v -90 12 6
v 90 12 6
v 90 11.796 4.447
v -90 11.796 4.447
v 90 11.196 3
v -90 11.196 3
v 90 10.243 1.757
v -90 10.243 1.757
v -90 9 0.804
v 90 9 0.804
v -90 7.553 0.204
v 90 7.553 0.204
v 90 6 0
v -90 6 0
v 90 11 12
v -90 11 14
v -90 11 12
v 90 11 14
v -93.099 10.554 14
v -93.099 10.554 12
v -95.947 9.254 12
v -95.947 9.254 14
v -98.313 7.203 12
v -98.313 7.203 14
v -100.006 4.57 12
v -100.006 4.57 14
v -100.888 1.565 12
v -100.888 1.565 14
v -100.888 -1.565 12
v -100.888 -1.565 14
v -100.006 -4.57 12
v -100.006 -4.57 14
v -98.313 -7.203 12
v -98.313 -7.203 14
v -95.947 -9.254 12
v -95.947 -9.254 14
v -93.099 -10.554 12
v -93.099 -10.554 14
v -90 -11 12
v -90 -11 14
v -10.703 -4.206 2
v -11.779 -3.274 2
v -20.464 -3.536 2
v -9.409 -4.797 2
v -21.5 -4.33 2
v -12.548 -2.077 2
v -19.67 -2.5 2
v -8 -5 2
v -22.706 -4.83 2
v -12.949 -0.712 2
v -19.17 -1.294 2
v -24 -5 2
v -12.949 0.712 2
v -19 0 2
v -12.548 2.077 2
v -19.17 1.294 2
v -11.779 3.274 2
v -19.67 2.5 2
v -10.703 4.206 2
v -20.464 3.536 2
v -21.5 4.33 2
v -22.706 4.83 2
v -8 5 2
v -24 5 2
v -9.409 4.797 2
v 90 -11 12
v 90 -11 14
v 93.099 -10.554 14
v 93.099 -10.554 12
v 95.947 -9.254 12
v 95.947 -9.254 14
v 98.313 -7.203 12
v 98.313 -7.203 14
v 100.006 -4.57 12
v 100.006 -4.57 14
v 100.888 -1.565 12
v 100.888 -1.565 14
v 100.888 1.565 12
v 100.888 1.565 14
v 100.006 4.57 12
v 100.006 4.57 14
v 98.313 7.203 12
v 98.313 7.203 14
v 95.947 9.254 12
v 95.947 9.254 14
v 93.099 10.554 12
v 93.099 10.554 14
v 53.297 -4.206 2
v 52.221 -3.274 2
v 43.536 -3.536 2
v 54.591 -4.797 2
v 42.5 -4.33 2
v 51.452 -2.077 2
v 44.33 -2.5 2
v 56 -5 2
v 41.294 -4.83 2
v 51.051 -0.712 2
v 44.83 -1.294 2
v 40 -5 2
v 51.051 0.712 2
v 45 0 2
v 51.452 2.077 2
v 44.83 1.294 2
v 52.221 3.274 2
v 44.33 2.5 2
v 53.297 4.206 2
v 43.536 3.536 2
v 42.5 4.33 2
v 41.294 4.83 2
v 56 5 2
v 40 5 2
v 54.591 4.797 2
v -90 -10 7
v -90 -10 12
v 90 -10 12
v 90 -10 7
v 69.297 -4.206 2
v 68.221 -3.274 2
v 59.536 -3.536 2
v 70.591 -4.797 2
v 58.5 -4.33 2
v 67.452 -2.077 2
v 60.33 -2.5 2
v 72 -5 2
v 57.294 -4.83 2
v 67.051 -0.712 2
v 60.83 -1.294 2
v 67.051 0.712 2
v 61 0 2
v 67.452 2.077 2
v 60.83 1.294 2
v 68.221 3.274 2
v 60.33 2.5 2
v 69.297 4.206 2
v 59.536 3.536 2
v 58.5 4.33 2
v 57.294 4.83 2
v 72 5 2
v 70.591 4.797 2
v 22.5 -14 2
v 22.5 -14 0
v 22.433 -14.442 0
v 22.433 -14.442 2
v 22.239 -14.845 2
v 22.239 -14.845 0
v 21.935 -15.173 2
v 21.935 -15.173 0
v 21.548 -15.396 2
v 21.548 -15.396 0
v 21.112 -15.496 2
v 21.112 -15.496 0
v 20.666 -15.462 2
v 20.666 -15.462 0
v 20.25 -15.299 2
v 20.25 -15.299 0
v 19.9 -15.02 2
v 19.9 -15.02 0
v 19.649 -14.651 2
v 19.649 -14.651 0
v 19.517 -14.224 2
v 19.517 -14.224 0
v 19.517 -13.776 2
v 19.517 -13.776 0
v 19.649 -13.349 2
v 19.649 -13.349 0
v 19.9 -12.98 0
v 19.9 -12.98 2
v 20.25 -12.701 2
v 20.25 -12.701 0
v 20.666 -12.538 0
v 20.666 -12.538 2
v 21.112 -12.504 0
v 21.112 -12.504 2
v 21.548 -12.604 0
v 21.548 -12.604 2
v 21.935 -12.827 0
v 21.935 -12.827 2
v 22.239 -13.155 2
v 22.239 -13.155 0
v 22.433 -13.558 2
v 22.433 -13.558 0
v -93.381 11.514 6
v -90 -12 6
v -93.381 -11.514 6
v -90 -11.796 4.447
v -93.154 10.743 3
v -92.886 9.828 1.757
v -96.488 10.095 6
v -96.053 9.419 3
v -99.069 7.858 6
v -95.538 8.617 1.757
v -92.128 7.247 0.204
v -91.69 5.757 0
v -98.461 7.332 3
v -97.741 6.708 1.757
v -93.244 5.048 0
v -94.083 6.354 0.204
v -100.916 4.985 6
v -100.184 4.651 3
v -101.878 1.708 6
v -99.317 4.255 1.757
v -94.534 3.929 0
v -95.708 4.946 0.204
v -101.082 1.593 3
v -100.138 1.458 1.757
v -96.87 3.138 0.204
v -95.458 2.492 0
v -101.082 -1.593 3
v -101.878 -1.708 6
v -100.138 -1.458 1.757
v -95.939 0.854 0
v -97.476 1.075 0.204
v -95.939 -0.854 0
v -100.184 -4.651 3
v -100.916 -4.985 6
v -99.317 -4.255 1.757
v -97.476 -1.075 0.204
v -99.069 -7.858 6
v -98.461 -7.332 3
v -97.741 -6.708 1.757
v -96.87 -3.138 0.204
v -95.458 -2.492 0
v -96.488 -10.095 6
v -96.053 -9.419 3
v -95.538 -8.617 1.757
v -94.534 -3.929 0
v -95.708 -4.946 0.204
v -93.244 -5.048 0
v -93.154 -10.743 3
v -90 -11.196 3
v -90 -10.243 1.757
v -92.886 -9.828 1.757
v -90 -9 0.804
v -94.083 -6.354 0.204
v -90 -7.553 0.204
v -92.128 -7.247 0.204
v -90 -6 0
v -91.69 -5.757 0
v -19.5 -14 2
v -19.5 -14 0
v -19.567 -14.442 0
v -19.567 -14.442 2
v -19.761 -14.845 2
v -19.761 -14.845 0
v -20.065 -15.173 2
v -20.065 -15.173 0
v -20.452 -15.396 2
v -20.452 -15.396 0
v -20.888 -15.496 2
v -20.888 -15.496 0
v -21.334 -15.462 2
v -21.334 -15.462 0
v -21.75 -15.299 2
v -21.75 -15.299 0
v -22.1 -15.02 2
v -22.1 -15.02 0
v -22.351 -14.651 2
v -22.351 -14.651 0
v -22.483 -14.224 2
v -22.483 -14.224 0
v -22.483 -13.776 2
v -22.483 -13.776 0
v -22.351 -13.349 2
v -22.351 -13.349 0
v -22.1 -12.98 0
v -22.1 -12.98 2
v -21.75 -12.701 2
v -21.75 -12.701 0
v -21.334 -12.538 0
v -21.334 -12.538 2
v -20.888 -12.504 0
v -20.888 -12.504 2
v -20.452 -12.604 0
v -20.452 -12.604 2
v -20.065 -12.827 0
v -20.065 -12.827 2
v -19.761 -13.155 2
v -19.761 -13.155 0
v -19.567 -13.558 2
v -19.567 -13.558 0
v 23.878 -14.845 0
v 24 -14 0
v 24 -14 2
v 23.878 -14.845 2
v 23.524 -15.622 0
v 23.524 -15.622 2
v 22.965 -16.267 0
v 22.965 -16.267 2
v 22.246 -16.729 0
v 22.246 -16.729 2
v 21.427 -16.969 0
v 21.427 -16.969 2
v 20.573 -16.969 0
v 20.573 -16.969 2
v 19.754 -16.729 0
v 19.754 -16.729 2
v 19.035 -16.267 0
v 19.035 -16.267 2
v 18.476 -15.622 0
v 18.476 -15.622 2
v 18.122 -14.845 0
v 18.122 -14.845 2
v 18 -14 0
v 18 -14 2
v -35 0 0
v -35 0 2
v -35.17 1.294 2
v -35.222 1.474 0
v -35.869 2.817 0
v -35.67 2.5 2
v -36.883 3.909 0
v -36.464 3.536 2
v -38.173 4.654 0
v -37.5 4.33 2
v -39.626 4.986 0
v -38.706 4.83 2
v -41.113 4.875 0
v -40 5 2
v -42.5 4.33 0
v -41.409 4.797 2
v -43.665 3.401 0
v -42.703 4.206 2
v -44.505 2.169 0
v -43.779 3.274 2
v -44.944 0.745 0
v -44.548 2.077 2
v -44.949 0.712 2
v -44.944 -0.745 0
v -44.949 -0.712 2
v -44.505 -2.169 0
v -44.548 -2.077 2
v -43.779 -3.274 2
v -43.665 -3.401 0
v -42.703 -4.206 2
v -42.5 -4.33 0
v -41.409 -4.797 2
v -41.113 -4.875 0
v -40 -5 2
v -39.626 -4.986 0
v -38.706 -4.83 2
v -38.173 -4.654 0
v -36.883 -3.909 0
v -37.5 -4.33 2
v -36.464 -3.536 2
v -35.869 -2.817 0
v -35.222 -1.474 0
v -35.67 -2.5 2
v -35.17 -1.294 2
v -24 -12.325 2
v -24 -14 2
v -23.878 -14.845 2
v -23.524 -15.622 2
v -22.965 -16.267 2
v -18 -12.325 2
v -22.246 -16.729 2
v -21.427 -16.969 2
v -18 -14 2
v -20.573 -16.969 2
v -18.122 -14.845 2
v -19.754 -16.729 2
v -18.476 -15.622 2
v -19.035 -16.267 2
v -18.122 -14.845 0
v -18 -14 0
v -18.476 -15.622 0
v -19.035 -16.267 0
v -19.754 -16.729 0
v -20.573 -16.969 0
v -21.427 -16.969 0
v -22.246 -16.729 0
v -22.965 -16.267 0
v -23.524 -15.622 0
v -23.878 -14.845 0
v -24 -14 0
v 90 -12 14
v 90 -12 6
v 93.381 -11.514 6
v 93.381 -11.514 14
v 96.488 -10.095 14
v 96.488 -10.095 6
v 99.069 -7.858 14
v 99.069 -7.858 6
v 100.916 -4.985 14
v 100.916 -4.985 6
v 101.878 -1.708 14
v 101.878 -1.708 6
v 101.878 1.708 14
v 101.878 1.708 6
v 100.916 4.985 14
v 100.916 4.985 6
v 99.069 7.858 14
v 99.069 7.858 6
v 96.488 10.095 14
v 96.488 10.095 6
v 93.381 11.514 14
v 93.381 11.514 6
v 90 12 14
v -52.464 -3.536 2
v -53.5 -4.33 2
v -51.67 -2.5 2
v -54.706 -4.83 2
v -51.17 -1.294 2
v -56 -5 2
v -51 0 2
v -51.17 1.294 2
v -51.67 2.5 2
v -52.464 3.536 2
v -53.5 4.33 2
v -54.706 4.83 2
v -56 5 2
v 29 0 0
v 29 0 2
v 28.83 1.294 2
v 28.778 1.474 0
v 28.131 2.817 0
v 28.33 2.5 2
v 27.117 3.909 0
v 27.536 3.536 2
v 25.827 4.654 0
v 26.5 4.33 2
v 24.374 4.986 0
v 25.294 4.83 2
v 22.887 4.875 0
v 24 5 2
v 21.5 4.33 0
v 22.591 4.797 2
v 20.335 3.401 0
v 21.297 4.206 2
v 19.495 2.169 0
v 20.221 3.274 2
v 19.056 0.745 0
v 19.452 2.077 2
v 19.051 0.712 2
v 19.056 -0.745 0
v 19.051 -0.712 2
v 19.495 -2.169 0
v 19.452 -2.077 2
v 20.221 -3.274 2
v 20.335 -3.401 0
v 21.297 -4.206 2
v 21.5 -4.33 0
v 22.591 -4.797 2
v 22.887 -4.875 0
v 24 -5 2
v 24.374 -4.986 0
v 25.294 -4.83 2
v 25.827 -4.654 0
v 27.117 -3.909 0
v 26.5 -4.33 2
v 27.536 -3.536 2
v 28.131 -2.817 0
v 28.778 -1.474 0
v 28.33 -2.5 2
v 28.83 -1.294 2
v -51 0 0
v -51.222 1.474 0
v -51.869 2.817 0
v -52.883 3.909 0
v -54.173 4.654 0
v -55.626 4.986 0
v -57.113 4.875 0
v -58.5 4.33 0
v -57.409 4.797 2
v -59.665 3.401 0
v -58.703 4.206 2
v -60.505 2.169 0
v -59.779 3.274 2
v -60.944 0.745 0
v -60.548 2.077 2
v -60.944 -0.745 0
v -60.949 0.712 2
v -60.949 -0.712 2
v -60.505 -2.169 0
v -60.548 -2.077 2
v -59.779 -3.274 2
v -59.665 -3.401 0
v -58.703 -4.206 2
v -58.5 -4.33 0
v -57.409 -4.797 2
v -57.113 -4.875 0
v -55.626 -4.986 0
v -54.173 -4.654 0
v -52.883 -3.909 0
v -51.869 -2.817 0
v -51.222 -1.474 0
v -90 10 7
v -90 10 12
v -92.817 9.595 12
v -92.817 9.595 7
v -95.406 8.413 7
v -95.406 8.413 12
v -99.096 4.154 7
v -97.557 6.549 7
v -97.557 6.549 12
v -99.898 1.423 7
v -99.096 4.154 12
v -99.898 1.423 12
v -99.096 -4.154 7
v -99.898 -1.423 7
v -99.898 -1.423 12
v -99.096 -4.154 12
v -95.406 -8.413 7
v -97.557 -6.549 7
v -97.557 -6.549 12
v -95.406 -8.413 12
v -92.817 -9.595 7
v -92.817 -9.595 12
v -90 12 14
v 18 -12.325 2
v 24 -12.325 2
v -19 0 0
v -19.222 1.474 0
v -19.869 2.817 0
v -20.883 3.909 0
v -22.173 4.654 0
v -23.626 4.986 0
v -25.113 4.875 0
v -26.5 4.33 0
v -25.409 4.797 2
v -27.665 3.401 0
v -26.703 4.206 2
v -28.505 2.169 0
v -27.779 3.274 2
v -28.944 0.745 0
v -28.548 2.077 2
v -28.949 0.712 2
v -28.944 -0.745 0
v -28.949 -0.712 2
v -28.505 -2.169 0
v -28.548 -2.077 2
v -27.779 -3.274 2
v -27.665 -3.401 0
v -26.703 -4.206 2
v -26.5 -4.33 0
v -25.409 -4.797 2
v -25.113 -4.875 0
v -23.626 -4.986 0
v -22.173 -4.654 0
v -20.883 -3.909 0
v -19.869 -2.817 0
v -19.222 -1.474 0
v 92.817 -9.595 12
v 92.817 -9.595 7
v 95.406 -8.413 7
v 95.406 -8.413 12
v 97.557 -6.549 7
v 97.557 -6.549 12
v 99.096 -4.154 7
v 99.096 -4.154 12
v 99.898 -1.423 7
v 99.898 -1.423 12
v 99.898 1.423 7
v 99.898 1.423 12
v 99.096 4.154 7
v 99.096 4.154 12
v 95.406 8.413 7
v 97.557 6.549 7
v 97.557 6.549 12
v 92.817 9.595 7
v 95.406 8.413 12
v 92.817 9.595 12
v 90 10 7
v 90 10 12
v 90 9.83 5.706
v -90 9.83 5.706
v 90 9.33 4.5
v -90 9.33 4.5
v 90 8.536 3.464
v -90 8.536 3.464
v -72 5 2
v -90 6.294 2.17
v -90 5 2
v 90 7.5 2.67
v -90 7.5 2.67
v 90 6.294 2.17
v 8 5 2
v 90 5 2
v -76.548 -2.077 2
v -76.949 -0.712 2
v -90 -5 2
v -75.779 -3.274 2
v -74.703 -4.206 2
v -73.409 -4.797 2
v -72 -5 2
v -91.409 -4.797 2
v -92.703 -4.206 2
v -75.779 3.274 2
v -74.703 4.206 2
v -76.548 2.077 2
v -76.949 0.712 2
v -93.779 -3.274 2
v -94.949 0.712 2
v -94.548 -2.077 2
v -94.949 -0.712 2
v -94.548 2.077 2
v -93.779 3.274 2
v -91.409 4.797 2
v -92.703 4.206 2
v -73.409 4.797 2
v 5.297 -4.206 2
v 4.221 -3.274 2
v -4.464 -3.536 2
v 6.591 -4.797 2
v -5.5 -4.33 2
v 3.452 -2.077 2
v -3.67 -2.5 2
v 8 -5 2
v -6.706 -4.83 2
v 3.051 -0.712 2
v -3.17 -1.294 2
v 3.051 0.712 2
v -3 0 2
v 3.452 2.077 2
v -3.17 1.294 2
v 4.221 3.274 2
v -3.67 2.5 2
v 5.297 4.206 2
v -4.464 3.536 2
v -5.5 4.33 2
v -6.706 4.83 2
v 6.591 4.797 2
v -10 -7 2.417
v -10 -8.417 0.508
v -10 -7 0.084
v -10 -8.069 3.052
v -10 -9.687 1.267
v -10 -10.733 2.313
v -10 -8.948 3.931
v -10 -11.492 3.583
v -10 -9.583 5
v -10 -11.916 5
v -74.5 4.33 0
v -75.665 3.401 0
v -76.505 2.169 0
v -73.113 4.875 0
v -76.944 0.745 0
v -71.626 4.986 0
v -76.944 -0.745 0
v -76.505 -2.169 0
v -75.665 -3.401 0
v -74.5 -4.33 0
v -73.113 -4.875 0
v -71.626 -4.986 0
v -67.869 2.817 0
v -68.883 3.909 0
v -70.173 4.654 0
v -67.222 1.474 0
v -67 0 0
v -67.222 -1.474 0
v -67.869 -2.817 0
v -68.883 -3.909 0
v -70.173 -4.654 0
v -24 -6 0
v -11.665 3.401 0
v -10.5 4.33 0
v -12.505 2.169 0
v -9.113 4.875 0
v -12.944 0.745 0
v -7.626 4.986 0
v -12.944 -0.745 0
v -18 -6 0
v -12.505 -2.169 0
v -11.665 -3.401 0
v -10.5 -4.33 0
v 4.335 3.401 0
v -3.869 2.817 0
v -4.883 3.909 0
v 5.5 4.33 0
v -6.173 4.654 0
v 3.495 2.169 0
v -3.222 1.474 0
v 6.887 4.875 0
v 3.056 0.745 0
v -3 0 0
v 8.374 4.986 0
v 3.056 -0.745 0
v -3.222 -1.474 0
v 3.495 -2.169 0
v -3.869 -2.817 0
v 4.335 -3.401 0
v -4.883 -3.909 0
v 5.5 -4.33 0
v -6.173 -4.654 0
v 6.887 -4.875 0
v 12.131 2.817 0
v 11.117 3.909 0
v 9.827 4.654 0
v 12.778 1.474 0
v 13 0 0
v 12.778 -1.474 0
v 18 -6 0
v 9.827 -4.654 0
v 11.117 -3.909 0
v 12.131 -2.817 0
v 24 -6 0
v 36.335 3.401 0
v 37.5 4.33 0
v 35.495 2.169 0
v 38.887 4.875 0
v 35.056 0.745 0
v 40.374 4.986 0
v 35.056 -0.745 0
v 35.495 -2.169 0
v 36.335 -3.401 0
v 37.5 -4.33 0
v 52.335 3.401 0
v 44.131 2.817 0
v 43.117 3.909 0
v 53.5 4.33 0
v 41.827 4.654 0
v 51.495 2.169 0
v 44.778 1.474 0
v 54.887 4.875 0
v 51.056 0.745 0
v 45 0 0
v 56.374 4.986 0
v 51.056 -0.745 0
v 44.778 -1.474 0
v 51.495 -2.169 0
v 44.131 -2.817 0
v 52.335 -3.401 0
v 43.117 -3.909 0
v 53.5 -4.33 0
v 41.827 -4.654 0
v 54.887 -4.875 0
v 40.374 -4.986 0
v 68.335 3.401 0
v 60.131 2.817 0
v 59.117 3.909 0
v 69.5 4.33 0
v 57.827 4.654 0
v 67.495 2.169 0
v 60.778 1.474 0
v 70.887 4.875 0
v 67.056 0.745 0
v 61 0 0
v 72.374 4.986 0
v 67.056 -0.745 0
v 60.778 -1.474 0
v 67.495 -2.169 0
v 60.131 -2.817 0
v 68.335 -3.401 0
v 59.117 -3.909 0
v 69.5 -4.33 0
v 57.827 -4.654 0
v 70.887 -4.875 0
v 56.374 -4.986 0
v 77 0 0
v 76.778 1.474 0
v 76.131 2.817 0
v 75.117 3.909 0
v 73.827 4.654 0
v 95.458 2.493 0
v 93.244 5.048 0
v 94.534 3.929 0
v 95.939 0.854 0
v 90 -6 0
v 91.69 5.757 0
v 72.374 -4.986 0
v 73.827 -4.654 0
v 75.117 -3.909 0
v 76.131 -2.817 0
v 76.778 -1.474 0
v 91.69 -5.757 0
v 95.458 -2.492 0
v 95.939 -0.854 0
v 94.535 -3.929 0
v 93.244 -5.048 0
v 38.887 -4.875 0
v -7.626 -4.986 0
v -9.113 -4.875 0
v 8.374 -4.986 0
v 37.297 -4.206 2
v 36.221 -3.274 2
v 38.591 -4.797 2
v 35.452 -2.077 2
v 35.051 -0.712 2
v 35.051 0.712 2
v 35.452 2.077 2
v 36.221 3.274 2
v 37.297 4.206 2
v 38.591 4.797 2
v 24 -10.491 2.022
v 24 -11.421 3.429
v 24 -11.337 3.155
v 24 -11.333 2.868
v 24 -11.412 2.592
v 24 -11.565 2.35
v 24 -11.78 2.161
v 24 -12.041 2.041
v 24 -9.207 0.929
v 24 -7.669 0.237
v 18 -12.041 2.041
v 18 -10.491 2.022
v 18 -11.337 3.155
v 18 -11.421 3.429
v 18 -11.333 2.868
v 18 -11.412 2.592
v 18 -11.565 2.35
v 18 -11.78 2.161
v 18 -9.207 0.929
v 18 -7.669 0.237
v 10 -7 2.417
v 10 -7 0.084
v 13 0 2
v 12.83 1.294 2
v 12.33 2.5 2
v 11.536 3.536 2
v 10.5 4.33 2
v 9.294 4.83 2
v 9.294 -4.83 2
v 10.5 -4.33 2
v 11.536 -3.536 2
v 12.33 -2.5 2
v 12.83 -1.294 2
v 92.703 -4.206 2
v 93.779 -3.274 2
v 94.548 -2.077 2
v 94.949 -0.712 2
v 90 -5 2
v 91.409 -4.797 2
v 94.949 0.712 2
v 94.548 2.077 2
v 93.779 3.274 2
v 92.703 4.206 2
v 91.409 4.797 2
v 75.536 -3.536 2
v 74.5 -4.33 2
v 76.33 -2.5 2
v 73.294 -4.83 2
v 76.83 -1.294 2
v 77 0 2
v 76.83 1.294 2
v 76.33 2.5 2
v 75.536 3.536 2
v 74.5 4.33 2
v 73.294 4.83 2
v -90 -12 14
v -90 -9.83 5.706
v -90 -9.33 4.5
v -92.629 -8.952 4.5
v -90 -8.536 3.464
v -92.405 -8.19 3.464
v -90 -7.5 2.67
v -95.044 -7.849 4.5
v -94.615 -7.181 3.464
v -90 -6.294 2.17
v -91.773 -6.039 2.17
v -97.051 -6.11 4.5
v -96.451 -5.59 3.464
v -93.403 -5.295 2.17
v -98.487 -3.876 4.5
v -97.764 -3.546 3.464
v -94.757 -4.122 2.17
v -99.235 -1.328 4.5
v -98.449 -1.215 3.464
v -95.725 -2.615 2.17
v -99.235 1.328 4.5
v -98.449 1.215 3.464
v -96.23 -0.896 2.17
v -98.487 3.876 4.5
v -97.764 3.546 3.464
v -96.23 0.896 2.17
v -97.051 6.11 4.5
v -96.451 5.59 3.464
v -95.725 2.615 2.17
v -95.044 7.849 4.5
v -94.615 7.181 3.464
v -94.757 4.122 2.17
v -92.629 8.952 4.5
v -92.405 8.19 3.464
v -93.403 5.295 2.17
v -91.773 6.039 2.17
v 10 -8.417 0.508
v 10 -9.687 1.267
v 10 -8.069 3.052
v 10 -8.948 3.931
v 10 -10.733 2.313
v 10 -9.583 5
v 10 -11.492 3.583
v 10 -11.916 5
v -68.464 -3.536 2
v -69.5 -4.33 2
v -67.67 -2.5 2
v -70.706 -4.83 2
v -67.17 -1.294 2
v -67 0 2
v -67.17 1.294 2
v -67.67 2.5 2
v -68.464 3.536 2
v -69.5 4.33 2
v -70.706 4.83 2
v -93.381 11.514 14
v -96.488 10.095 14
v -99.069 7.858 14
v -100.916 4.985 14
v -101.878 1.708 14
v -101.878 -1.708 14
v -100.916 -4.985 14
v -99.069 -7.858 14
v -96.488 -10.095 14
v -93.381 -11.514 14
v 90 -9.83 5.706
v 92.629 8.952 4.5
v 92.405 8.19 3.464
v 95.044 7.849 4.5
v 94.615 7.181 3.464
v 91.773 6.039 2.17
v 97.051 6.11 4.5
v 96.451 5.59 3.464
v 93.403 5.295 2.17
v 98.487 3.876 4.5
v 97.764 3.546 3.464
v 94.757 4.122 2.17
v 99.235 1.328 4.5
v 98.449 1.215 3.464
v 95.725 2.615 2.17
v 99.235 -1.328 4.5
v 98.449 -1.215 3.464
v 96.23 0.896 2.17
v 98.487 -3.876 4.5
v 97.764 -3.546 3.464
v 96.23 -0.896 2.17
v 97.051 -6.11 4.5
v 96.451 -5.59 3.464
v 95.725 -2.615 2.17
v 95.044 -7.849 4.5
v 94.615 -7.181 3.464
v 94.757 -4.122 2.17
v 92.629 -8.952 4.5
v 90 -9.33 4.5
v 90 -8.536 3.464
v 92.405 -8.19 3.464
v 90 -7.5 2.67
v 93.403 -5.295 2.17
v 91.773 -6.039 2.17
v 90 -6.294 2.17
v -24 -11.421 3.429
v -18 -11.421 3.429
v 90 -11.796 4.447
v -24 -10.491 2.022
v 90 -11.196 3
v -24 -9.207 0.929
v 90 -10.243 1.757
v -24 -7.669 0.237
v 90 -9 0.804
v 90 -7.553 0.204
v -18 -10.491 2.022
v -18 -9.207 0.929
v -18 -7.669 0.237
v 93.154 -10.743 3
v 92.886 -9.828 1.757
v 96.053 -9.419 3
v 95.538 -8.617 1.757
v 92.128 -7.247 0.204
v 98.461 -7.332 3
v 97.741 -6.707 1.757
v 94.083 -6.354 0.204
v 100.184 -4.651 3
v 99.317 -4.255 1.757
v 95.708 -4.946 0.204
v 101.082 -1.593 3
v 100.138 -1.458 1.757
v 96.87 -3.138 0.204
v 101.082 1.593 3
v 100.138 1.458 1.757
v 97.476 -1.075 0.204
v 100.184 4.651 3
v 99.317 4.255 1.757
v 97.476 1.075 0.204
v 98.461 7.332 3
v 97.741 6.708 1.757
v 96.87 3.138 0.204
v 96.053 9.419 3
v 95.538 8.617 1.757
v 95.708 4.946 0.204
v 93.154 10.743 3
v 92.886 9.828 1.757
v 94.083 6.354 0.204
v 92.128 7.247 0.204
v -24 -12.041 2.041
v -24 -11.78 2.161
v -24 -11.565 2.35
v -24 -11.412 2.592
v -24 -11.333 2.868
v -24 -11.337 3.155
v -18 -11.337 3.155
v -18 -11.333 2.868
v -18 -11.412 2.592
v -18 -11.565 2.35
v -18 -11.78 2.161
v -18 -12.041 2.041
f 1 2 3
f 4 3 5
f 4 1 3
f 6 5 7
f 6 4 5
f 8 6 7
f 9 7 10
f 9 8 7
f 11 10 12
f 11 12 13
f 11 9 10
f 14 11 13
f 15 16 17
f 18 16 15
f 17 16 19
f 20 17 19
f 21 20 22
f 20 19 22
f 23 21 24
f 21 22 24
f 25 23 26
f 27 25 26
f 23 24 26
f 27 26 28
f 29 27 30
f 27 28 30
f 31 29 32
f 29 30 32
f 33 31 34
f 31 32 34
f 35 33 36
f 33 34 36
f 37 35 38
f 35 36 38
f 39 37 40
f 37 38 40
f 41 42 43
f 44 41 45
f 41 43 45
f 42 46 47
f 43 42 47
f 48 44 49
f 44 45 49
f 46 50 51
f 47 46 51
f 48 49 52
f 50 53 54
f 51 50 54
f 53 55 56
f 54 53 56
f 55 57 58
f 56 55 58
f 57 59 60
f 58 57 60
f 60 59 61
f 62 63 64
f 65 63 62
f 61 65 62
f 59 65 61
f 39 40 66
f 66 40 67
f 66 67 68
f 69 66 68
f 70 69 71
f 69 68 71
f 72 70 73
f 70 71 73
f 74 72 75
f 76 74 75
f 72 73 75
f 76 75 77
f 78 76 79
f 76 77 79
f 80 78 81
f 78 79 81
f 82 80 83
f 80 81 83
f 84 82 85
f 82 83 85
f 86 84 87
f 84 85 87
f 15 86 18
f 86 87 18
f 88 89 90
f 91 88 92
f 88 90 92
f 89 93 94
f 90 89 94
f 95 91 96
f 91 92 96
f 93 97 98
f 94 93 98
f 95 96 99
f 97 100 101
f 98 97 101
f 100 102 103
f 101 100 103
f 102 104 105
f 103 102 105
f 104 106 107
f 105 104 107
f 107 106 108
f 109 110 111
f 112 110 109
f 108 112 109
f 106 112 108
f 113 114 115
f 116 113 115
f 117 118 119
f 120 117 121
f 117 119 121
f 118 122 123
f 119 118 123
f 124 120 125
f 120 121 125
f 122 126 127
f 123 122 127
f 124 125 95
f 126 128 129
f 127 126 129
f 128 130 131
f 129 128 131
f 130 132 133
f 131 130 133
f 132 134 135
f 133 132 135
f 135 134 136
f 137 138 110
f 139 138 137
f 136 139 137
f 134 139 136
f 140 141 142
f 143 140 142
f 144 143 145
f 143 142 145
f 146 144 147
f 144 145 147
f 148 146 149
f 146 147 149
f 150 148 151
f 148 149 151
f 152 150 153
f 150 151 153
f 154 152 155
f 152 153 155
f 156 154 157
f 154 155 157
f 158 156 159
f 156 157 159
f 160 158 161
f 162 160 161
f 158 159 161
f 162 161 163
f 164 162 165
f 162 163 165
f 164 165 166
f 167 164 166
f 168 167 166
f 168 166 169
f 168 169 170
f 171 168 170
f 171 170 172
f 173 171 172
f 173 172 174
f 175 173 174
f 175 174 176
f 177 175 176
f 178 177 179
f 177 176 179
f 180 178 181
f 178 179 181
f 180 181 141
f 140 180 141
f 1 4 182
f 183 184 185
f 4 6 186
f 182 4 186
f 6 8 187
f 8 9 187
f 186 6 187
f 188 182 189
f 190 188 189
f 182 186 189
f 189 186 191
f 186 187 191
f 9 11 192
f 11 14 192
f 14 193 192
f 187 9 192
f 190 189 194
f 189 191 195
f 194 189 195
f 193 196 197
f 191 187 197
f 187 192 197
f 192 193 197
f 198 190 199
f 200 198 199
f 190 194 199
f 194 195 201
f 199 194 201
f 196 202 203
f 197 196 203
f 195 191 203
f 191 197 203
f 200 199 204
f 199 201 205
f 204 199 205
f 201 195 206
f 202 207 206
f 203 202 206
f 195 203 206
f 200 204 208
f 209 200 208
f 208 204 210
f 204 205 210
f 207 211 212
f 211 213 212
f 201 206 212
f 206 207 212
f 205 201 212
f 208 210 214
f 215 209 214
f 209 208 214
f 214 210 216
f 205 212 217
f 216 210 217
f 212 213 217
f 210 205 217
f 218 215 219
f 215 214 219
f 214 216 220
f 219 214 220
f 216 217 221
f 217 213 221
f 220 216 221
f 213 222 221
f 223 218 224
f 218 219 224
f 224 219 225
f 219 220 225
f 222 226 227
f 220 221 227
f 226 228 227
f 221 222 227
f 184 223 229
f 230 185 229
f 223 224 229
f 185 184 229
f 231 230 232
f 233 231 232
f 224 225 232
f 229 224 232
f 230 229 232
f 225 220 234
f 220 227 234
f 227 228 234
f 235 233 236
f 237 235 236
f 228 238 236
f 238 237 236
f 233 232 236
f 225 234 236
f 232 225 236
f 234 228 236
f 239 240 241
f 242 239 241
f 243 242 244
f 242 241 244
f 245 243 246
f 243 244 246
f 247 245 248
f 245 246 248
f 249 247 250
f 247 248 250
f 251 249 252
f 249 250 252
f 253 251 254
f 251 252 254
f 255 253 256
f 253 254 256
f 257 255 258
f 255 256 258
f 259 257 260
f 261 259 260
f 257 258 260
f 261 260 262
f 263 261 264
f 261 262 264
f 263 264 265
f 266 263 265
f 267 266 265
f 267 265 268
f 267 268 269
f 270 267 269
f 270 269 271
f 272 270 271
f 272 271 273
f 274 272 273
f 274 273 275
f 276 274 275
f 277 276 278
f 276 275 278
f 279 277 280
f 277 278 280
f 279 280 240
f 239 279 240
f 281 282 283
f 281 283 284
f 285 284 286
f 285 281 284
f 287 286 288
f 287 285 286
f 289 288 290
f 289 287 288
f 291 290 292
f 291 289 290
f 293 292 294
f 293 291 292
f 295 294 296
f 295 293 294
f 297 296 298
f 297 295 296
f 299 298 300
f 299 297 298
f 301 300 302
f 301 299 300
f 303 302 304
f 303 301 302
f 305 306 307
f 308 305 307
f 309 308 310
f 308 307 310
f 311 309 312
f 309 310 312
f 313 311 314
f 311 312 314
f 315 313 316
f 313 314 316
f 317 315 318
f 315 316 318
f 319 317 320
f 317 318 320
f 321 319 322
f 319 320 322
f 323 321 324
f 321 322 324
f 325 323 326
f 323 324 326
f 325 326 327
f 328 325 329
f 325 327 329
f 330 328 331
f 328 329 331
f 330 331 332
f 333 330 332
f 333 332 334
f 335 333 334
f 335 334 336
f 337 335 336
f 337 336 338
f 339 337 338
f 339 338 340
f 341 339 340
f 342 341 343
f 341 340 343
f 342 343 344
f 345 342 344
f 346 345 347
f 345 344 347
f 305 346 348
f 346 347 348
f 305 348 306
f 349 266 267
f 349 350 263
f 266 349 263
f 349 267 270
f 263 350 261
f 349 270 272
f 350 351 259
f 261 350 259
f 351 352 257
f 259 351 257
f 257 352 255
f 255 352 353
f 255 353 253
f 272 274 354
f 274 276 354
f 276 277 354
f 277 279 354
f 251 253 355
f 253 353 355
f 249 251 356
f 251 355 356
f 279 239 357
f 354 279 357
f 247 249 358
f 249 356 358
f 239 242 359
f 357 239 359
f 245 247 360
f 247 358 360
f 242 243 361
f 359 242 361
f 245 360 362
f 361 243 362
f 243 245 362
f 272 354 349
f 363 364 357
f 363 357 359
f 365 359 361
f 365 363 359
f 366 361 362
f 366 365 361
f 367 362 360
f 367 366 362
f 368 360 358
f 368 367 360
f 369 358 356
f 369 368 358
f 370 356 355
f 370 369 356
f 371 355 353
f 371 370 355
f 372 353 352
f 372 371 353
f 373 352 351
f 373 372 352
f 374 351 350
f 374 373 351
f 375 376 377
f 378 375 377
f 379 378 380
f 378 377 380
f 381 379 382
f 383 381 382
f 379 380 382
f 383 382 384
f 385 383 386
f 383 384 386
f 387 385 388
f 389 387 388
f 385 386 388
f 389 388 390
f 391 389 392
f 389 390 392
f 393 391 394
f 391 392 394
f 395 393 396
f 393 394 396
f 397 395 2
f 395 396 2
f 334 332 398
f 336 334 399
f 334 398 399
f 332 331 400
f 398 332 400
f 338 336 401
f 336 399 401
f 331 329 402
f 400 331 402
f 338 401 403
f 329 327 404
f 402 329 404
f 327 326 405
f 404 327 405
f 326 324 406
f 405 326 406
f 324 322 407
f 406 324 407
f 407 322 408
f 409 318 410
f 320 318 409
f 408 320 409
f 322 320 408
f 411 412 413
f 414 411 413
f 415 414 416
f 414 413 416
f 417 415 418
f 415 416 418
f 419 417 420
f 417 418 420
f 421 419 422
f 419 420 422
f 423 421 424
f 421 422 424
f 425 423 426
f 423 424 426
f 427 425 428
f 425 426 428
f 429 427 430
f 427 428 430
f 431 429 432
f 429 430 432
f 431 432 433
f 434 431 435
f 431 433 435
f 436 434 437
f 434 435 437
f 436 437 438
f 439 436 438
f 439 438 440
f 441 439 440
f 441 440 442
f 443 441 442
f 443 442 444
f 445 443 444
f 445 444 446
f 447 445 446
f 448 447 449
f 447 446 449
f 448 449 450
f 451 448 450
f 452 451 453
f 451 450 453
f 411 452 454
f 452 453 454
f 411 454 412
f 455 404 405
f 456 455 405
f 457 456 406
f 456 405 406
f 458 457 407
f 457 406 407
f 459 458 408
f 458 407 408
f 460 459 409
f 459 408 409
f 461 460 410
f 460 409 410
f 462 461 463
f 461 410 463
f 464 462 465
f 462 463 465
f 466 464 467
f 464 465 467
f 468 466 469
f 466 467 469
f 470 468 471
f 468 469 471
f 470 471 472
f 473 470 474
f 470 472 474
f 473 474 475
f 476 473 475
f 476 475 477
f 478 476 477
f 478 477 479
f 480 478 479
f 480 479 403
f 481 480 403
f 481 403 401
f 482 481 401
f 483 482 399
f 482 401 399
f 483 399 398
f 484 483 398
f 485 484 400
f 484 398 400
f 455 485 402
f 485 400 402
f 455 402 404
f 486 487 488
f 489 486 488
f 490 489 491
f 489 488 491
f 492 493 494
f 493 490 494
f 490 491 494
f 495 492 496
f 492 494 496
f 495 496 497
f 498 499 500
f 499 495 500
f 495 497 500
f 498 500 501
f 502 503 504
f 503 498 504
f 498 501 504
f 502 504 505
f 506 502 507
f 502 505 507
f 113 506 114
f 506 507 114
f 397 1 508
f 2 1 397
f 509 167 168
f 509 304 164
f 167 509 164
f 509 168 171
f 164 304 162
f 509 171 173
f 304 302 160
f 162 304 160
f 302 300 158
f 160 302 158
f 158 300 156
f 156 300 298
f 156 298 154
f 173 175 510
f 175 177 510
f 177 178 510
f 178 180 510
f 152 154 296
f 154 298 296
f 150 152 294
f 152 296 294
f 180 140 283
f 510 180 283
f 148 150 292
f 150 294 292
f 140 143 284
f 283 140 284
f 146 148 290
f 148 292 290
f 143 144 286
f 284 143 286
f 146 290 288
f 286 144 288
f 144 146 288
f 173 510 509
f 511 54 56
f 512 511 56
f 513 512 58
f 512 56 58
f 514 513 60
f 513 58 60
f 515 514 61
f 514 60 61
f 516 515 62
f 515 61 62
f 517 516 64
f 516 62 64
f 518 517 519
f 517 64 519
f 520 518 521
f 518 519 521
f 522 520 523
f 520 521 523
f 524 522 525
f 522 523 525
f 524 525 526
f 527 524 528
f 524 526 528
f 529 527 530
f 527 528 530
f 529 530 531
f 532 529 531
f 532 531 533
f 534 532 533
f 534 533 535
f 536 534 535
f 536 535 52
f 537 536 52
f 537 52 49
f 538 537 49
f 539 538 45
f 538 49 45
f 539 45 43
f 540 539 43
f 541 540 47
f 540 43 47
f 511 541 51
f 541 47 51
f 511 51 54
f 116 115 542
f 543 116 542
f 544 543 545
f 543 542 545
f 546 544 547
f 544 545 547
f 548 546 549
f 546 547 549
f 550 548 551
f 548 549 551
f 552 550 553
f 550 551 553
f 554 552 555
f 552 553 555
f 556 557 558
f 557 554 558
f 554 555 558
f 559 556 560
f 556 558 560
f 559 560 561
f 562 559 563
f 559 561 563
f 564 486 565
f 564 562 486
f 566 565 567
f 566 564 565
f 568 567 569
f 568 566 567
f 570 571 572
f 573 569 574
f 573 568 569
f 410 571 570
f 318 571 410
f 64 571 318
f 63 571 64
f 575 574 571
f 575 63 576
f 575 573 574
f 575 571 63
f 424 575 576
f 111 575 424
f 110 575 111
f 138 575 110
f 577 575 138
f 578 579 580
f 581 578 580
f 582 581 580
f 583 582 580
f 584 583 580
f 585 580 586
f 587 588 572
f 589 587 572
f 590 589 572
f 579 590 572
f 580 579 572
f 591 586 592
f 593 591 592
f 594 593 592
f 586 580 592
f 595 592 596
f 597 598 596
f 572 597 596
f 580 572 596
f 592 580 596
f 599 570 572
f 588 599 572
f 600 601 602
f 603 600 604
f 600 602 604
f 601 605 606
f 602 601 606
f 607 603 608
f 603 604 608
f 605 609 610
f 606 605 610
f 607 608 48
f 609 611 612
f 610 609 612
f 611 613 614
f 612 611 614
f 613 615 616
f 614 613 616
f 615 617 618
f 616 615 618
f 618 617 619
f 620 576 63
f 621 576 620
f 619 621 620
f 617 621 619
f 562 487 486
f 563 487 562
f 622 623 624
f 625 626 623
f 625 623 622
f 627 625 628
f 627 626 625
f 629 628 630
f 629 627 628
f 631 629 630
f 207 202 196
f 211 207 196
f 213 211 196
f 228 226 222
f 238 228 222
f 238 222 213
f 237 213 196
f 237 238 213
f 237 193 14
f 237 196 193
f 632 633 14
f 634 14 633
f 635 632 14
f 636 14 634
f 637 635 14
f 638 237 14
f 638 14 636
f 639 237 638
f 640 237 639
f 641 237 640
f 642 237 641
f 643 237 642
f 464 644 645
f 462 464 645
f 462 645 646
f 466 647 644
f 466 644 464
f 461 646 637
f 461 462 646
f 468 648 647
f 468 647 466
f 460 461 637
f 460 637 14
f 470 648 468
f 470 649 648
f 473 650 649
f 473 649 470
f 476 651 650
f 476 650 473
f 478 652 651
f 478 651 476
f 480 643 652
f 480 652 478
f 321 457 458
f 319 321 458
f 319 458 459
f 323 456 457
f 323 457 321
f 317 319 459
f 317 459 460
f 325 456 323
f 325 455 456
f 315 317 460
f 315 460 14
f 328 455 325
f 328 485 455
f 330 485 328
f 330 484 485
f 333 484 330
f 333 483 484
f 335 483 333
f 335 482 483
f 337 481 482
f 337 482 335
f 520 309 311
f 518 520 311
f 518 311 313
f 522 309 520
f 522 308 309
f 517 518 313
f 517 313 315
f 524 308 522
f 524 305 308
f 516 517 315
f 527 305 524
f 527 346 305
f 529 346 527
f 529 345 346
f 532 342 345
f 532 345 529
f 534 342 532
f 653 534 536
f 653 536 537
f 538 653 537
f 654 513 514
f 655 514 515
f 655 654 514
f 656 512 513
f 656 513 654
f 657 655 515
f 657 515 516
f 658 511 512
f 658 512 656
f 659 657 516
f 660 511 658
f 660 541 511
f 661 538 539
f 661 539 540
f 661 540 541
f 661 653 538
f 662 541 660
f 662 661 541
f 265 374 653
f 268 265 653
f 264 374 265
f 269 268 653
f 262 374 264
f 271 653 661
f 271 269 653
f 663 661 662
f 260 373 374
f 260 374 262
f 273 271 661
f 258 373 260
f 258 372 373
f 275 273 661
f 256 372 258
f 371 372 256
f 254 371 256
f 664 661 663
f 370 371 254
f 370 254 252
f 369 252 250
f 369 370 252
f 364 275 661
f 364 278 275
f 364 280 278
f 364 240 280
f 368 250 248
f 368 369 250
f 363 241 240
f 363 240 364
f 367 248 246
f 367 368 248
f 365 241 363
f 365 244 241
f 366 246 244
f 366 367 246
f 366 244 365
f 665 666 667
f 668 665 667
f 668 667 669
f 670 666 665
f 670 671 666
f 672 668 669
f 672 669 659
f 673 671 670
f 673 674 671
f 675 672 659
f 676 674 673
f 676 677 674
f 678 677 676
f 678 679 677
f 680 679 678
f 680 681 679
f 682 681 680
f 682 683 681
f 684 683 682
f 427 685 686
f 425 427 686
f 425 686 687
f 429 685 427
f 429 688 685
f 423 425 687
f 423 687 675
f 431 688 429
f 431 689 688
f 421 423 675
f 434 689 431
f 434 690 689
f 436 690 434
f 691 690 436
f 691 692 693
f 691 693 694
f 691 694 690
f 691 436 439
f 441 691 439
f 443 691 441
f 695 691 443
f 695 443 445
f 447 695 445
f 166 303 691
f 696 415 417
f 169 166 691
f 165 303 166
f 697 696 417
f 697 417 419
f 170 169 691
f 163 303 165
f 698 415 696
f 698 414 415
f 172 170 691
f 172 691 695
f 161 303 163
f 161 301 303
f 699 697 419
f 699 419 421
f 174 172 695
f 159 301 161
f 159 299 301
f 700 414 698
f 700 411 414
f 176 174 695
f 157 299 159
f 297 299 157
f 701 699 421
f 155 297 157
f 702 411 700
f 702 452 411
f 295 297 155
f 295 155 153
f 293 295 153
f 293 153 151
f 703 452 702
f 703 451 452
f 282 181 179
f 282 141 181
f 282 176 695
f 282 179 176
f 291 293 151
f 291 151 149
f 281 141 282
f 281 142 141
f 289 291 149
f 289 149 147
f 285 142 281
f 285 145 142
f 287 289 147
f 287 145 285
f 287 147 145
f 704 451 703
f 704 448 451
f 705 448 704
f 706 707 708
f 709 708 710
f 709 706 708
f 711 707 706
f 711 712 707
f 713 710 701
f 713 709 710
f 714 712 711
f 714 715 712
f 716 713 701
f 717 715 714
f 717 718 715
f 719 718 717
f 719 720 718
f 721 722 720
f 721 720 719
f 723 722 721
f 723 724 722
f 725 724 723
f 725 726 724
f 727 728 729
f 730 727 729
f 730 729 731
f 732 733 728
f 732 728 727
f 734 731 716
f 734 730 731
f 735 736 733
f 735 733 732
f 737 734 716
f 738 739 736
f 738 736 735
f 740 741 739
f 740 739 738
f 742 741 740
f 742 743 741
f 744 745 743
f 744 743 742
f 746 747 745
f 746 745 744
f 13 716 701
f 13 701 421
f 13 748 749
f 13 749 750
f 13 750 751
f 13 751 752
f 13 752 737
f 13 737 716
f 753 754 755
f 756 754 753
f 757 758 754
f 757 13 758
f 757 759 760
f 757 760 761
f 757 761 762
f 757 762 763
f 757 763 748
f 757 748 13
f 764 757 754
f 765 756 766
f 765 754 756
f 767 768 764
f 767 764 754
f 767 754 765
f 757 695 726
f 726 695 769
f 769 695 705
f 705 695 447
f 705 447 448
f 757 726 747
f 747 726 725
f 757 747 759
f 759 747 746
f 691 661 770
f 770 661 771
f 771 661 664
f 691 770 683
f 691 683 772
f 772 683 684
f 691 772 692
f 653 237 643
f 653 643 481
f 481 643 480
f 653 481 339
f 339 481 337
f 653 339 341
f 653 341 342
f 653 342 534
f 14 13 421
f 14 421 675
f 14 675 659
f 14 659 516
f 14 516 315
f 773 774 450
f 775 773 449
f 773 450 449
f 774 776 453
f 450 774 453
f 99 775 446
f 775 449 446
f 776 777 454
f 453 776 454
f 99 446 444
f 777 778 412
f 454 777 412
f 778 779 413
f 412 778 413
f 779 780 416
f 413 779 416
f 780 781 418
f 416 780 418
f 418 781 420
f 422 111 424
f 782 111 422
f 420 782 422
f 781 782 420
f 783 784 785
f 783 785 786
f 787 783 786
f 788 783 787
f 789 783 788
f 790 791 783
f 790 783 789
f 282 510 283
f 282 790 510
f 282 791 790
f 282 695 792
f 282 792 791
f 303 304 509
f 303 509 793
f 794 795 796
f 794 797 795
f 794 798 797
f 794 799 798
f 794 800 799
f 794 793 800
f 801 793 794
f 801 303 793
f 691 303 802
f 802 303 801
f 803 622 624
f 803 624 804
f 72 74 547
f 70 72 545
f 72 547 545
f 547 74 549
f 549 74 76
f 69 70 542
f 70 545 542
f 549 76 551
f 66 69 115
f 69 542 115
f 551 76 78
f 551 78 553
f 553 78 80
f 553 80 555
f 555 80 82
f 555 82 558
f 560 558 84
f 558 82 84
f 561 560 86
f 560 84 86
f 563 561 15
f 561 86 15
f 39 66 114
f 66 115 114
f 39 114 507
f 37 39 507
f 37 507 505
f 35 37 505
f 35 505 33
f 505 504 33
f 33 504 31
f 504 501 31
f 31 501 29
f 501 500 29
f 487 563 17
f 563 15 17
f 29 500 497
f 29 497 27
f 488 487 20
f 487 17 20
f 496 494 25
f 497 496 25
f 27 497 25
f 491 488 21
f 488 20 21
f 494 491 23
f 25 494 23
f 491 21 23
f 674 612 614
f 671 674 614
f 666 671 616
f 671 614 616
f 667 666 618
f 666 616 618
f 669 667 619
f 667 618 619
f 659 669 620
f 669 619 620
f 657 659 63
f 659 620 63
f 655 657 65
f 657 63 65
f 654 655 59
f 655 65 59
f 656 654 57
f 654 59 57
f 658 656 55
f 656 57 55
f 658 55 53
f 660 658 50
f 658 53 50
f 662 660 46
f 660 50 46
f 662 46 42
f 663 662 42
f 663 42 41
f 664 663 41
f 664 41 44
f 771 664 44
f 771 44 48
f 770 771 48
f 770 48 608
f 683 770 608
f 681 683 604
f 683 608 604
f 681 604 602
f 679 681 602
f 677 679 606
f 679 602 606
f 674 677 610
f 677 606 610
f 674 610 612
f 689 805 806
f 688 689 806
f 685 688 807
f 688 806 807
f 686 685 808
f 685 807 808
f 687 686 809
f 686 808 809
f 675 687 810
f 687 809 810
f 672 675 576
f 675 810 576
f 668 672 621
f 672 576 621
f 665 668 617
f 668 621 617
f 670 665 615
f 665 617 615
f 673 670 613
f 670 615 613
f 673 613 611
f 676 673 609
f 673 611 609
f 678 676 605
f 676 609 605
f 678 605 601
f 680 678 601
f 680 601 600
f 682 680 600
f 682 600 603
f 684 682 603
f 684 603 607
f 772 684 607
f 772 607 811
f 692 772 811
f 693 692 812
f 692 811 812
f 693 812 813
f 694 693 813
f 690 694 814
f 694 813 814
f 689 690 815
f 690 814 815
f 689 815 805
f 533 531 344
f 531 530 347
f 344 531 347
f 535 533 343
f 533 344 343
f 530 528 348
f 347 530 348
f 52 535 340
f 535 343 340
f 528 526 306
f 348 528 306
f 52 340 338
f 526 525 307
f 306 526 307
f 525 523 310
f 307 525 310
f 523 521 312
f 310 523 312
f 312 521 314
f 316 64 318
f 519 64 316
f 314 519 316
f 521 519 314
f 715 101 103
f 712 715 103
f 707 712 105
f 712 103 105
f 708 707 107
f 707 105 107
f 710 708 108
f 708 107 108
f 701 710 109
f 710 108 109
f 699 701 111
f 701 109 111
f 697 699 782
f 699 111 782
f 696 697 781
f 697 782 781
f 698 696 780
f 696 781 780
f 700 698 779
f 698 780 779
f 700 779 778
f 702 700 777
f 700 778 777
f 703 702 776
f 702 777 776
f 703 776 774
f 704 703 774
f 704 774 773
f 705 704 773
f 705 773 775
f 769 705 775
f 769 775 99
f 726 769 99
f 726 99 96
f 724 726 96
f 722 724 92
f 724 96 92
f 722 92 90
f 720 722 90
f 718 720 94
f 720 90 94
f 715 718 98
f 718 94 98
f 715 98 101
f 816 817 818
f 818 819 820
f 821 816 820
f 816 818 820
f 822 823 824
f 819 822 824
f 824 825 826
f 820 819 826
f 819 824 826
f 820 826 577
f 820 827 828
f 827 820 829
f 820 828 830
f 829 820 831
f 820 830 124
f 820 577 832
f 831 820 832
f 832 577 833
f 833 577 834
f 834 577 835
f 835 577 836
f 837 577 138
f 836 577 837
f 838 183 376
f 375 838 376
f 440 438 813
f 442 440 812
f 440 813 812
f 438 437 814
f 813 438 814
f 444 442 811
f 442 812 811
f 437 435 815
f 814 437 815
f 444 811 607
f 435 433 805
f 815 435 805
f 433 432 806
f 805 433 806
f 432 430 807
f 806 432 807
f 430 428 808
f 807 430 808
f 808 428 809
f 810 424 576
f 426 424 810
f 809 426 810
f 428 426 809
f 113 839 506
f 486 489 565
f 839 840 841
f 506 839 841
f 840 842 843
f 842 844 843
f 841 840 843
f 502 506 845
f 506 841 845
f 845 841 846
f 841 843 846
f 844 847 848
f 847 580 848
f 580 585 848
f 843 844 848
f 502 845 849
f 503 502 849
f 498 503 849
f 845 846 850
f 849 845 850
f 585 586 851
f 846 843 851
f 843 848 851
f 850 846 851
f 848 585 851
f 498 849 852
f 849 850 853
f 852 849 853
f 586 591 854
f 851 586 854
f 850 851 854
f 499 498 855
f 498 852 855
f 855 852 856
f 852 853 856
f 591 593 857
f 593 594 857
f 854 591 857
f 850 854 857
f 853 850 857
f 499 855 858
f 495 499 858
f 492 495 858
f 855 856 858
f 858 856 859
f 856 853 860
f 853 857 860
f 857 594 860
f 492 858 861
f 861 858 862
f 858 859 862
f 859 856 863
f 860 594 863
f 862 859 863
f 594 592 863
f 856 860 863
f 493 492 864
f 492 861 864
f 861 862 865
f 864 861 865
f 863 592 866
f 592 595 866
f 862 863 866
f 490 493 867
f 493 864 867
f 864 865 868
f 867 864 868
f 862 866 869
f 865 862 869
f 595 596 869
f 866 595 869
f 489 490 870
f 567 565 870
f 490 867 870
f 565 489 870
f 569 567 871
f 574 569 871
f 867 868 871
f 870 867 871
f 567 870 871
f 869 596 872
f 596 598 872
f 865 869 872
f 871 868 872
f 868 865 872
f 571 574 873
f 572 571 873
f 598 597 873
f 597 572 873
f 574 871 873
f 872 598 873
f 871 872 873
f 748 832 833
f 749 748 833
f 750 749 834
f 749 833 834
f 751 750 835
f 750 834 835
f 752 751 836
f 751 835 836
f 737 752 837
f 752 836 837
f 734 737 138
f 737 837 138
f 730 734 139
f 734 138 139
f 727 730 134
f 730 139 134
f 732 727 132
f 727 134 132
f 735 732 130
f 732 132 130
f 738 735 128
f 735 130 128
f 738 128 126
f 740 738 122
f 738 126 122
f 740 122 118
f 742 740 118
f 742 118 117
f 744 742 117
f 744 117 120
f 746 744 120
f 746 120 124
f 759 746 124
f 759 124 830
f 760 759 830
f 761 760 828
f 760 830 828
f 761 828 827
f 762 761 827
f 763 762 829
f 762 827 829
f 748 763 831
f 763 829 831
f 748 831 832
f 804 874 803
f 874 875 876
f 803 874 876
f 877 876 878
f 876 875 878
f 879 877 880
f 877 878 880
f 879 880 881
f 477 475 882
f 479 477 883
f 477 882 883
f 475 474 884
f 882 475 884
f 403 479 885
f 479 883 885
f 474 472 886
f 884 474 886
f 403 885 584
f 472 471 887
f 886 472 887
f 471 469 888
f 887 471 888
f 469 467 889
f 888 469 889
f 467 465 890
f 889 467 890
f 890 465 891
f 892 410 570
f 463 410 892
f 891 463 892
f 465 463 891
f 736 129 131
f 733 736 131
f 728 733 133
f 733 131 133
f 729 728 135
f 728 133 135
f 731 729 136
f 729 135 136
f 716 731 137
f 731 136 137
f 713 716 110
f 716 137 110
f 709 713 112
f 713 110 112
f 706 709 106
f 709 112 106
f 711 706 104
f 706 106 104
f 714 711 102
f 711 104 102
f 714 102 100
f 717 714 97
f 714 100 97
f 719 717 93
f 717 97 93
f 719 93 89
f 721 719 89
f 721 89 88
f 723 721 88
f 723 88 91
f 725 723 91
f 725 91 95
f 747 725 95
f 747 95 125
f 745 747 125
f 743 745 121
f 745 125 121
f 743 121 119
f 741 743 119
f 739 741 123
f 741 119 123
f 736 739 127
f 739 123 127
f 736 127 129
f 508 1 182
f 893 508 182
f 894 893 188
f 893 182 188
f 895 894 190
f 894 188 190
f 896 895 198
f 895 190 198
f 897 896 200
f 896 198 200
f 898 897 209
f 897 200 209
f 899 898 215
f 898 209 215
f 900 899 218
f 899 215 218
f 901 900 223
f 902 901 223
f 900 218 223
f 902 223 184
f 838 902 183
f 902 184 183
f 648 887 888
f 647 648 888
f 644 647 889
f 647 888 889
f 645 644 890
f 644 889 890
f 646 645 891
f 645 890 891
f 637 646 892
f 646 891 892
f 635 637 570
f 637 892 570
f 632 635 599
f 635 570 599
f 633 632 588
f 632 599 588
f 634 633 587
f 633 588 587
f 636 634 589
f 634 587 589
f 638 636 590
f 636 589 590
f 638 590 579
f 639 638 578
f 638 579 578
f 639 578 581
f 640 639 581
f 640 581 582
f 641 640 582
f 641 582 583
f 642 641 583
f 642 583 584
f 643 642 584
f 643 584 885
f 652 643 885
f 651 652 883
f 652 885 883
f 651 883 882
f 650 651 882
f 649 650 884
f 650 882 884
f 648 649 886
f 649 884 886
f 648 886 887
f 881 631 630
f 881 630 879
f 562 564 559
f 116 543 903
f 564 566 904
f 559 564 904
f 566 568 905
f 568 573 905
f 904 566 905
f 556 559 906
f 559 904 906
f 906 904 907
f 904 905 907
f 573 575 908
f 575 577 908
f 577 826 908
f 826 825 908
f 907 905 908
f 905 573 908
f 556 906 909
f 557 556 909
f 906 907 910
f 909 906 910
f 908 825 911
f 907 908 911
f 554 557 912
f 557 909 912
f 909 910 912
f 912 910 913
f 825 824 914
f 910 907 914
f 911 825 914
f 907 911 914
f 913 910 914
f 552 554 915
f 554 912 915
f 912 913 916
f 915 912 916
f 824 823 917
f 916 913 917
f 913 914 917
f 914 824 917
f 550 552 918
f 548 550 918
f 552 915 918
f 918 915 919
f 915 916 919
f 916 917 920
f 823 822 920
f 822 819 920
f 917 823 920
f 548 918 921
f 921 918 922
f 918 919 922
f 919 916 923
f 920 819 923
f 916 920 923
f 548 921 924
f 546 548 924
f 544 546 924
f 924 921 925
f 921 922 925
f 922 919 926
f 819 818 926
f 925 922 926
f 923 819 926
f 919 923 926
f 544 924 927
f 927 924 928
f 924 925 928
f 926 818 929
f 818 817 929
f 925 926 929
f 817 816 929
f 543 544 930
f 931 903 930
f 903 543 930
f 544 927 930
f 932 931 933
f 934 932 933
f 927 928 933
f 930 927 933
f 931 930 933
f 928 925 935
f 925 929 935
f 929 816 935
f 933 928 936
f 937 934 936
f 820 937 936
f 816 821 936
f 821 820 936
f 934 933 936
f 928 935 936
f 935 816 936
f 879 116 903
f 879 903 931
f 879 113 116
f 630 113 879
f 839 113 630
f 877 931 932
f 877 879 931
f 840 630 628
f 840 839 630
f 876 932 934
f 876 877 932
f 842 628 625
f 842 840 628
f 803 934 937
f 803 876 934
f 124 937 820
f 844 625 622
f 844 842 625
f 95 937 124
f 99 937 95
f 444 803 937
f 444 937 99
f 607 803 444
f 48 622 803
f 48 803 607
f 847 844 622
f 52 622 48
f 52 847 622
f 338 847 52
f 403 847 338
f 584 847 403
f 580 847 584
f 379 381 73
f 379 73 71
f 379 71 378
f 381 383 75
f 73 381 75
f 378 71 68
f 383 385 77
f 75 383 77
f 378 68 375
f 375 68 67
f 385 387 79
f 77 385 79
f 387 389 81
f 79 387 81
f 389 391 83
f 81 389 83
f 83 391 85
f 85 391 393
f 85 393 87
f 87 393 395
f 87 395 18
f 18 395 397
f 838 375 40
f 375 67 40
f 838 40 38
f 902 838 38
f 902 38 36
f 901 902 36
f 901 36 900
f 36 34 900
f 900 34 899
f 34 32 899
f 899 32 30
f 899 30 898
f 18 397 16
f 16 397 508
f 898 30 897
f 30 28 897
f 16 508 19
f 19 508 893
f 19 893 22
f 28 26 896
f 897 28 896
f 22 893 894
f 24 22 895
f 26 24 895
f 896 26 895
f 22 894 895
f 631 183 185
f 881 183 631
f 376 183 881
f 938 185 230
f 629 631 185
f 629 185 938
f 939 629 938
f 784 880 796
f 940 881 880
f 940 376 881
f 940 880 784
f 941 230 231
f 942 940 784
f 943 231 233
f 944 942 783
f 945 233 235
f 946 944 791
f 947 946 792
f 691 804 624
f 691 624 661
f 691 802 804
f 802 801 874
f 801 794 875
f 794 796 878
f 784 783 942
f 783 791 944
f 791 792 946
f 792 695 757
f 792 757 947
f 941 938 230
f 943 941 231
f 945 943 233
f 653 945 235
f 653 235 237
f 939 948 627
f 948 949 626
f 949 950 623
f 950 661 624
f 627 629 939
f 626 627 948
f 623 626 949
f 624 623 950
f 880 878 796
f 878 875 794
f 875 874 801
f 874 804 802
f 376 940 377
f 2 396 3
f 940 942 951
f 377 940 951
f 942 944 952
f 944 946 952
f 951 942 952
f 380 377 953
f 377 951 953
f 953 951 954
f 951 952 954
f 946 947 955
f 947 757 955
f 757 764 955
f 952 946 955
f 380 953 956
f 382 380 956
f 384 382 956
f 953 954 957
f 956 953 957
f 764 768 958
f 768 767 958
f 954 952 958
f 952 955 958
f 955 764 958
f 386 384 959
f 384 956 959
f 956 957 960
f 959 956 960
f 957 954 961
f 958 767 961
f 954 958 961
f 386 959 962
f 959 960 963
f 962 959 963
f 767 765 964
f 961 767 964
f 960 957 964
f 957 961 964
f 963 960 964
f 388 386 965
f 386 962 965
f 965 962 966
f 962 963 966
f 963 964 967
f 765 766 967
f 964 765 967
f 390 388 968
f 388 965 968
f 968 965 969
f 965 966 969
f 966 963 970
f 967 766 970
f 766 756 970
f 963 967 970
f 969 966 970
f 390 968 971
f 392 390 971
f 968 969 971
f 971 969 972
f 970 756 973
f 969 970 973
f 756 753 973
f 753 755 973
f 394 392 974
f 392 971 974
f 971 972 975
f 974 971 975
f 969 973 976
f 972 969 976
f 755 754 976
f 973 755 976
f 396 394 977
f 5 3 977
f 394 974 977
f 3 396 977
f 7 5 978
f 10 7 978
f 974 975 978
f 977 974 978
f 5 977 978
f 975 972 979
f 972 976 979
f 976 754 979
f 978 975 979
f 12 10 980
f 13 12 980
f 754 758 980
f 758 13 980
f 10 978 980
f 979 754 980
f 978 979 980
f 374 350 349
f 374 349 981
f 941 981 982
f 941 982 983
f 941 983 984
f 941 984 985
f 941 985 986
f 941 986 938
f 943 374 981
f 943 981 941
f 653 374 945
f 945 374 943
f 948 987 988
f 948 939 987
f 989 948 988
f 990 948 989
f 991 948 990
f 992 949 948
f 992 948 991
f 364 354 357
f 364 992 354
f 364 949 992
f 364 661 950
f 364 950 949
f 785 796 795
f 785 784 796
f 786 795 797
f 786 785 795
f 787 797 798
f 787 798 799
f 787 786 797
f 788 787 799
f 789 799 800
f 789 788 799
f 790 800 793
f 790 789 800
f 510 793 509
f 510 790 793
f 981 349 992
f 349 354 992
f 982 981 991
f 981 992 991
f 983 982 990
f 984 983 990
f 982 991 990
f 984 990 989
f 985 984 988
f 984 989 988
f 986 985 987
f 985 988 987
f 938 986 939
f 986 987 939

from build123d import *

# Parameters (mm, degrees)
PAD_DEPTH       = 14
POCKET_DEPTH    = 12
FILLET_R        = 5
FILLET001_R     = 6
SKETCH002_R     = 1.5
PAD001_DEPTH    = 2
FILLET002_R     = 1
SKETCH003_R     = 5
POCKET001_DEPTH = 2.001
POCKET002_DEPTH = 2
SKETCH005_W     = 20
SKETCH005_H     = 5
POCKET003_DEPTH = 5


with BuildPart() as part:
    # Sketch → Pad (new body)
    with BuildSketch(Plane.XY):
        with BuildLine():
            Line((-90, 12), (89.999963, 12))
            ThreePointArc((90, -12), (102, 1.9e-05), (89.999963, 12))
            Line((-90, -12), (90, -12))
            ThreePointArc((-90, 12), (-102, 0), (-90, -12))
        make_face()
    extrude(amount=PAD_DEPTH)

    # Sketch001 (on Face6 of Pad) → Pocket (cut)
    with BuildSketch(Plane.XY.offset(14)):
        with BuildLine():
            Line((-90, 10), (89.999996, 10))
            ThreePointArc((90, -10), (100, 2e-06), (89.999996, 10))
            Line((-90, -10), (90, -10))
            ThreePointArc((-90, 10), (-100, 0), (-90, -10))
        make_face()
    extrude(amount=-POCKET_DEPTH, mode=Mode.SUBTRACT)

    # Fillet
    fillet_edges = [part.edges().sort_by_distance(p)[0] for p in [
        (-2e-06, 10, 2),
    ]]
    fillet(fillet_edges, radius=FILLET_R)

    # Fillet001
    fillet001_edges = [part.edges().sort_by_distance(p)[0] for p in [
        (0, -12, 0),
    ]]
    fillet(fillet001_edges, radius=FILLET001_R)

    # Sketch002 (on Face9 of Fillet001) → Pad001 (join)
    with BuildSketch(Plane(origin=(0, 0, 0), x_dir=(1, 0, 0), z_dir=(0, 0, -1))):
        with BuildLine():
            Line((-24, 14), (-24, 0))
            Line((-24, 0), (24, 0))
            Line((24, 0), (24, 14))
            ThreePointArc((24, 14), (21, 17), (18, 14))
            Line((18, 14), (18, 5.336054))
            Line((18, 5.336054), (-18, 5.336054))
            Line((-18, 5.336054), (-18, 14))
            ThreePointArc((-18, 14), (-21, 17), (-24, 14))
        make_face()
        with Locations((21, 14)):
            Circle(SKETCH002_R, mode=Mode.SUBTRACT)
        with Locations((-21, 14)):
            Circle(SKETCH002_R, mode=Mode.SUBTRACT)
    extrude(amount=-PAD001_DEPTH)

    # Fillet002
    fillet002_edges = [part.edges().sort_by_distance(p)[0] for p in [
        (21, -10.472136, 2),
        (-21, -10.472136, 2),
    ]]
    fillet(fillet002_edges, radius=FILLET002_R)

    # Sketch003 (on Face35 of Fillet002) → Pocket001 (cut, through all)
    with BuildSketch(Plane.XY.offset(2)):
        with Locations((-72, 0)):
            Circle(SKETCH003_R)
        with Locations((-56, 0)):
            Circle(SKETCH003_R)
        with Locations((-40, 0)):
            Circle(SKETCH003_R)
        with Locations((-24, 0)):
            Circle(SKETCH003_R)
        with Locations((-8, 0)):
            Circle(SKETCH003_R)
        with Locations((8, 0)):
            Circle(SKETCH003_R)
        with Locations((24, 0)):
            Circle(SKETCH003_R)
        with Locations((40, 0)):
            Circle(SKETCH003_R)
        with Locations((56, 0)):
            Circle(SKETCH003_R)
        with Locations((72, 0)):
            Circle(SKETCH003_R)
    extrude(amount=-POCKET001_DEPTH, mode=Mode.SUBTRACT)

    # Sketch004 (on Face33 of Pocket001) → Pocket002 (cut)
    with BuildSketch(Plane.XY.offset(14)):
        with BuildLine():
            Line((-90, 11), (90.000004, 11))
            ThreePointArc((90, -11), (101, -2e-06), (90.000004, 11))
            Line((-90, -11), (90, -11))
            ThreePointArc((-90, 11), (-101, 0), (-90, -11))
        make_face()
    extrude(amount=-POCKET002_DEPTH, mode=Mode.SUBTRACT)

    # Sketch005 (on Face11 of Pocket002) → Pocket003 (cut)
    with BuildSketch(Plane.XZ.offset(12)):
        with Locations((0, 2.5)):
            Rectangle(SKETCH005_W, SKETCH005_H)
    extrude(amount=-POCKET003_DEPTH, mode=Mode.SUBTRACT)


solid = part.part
